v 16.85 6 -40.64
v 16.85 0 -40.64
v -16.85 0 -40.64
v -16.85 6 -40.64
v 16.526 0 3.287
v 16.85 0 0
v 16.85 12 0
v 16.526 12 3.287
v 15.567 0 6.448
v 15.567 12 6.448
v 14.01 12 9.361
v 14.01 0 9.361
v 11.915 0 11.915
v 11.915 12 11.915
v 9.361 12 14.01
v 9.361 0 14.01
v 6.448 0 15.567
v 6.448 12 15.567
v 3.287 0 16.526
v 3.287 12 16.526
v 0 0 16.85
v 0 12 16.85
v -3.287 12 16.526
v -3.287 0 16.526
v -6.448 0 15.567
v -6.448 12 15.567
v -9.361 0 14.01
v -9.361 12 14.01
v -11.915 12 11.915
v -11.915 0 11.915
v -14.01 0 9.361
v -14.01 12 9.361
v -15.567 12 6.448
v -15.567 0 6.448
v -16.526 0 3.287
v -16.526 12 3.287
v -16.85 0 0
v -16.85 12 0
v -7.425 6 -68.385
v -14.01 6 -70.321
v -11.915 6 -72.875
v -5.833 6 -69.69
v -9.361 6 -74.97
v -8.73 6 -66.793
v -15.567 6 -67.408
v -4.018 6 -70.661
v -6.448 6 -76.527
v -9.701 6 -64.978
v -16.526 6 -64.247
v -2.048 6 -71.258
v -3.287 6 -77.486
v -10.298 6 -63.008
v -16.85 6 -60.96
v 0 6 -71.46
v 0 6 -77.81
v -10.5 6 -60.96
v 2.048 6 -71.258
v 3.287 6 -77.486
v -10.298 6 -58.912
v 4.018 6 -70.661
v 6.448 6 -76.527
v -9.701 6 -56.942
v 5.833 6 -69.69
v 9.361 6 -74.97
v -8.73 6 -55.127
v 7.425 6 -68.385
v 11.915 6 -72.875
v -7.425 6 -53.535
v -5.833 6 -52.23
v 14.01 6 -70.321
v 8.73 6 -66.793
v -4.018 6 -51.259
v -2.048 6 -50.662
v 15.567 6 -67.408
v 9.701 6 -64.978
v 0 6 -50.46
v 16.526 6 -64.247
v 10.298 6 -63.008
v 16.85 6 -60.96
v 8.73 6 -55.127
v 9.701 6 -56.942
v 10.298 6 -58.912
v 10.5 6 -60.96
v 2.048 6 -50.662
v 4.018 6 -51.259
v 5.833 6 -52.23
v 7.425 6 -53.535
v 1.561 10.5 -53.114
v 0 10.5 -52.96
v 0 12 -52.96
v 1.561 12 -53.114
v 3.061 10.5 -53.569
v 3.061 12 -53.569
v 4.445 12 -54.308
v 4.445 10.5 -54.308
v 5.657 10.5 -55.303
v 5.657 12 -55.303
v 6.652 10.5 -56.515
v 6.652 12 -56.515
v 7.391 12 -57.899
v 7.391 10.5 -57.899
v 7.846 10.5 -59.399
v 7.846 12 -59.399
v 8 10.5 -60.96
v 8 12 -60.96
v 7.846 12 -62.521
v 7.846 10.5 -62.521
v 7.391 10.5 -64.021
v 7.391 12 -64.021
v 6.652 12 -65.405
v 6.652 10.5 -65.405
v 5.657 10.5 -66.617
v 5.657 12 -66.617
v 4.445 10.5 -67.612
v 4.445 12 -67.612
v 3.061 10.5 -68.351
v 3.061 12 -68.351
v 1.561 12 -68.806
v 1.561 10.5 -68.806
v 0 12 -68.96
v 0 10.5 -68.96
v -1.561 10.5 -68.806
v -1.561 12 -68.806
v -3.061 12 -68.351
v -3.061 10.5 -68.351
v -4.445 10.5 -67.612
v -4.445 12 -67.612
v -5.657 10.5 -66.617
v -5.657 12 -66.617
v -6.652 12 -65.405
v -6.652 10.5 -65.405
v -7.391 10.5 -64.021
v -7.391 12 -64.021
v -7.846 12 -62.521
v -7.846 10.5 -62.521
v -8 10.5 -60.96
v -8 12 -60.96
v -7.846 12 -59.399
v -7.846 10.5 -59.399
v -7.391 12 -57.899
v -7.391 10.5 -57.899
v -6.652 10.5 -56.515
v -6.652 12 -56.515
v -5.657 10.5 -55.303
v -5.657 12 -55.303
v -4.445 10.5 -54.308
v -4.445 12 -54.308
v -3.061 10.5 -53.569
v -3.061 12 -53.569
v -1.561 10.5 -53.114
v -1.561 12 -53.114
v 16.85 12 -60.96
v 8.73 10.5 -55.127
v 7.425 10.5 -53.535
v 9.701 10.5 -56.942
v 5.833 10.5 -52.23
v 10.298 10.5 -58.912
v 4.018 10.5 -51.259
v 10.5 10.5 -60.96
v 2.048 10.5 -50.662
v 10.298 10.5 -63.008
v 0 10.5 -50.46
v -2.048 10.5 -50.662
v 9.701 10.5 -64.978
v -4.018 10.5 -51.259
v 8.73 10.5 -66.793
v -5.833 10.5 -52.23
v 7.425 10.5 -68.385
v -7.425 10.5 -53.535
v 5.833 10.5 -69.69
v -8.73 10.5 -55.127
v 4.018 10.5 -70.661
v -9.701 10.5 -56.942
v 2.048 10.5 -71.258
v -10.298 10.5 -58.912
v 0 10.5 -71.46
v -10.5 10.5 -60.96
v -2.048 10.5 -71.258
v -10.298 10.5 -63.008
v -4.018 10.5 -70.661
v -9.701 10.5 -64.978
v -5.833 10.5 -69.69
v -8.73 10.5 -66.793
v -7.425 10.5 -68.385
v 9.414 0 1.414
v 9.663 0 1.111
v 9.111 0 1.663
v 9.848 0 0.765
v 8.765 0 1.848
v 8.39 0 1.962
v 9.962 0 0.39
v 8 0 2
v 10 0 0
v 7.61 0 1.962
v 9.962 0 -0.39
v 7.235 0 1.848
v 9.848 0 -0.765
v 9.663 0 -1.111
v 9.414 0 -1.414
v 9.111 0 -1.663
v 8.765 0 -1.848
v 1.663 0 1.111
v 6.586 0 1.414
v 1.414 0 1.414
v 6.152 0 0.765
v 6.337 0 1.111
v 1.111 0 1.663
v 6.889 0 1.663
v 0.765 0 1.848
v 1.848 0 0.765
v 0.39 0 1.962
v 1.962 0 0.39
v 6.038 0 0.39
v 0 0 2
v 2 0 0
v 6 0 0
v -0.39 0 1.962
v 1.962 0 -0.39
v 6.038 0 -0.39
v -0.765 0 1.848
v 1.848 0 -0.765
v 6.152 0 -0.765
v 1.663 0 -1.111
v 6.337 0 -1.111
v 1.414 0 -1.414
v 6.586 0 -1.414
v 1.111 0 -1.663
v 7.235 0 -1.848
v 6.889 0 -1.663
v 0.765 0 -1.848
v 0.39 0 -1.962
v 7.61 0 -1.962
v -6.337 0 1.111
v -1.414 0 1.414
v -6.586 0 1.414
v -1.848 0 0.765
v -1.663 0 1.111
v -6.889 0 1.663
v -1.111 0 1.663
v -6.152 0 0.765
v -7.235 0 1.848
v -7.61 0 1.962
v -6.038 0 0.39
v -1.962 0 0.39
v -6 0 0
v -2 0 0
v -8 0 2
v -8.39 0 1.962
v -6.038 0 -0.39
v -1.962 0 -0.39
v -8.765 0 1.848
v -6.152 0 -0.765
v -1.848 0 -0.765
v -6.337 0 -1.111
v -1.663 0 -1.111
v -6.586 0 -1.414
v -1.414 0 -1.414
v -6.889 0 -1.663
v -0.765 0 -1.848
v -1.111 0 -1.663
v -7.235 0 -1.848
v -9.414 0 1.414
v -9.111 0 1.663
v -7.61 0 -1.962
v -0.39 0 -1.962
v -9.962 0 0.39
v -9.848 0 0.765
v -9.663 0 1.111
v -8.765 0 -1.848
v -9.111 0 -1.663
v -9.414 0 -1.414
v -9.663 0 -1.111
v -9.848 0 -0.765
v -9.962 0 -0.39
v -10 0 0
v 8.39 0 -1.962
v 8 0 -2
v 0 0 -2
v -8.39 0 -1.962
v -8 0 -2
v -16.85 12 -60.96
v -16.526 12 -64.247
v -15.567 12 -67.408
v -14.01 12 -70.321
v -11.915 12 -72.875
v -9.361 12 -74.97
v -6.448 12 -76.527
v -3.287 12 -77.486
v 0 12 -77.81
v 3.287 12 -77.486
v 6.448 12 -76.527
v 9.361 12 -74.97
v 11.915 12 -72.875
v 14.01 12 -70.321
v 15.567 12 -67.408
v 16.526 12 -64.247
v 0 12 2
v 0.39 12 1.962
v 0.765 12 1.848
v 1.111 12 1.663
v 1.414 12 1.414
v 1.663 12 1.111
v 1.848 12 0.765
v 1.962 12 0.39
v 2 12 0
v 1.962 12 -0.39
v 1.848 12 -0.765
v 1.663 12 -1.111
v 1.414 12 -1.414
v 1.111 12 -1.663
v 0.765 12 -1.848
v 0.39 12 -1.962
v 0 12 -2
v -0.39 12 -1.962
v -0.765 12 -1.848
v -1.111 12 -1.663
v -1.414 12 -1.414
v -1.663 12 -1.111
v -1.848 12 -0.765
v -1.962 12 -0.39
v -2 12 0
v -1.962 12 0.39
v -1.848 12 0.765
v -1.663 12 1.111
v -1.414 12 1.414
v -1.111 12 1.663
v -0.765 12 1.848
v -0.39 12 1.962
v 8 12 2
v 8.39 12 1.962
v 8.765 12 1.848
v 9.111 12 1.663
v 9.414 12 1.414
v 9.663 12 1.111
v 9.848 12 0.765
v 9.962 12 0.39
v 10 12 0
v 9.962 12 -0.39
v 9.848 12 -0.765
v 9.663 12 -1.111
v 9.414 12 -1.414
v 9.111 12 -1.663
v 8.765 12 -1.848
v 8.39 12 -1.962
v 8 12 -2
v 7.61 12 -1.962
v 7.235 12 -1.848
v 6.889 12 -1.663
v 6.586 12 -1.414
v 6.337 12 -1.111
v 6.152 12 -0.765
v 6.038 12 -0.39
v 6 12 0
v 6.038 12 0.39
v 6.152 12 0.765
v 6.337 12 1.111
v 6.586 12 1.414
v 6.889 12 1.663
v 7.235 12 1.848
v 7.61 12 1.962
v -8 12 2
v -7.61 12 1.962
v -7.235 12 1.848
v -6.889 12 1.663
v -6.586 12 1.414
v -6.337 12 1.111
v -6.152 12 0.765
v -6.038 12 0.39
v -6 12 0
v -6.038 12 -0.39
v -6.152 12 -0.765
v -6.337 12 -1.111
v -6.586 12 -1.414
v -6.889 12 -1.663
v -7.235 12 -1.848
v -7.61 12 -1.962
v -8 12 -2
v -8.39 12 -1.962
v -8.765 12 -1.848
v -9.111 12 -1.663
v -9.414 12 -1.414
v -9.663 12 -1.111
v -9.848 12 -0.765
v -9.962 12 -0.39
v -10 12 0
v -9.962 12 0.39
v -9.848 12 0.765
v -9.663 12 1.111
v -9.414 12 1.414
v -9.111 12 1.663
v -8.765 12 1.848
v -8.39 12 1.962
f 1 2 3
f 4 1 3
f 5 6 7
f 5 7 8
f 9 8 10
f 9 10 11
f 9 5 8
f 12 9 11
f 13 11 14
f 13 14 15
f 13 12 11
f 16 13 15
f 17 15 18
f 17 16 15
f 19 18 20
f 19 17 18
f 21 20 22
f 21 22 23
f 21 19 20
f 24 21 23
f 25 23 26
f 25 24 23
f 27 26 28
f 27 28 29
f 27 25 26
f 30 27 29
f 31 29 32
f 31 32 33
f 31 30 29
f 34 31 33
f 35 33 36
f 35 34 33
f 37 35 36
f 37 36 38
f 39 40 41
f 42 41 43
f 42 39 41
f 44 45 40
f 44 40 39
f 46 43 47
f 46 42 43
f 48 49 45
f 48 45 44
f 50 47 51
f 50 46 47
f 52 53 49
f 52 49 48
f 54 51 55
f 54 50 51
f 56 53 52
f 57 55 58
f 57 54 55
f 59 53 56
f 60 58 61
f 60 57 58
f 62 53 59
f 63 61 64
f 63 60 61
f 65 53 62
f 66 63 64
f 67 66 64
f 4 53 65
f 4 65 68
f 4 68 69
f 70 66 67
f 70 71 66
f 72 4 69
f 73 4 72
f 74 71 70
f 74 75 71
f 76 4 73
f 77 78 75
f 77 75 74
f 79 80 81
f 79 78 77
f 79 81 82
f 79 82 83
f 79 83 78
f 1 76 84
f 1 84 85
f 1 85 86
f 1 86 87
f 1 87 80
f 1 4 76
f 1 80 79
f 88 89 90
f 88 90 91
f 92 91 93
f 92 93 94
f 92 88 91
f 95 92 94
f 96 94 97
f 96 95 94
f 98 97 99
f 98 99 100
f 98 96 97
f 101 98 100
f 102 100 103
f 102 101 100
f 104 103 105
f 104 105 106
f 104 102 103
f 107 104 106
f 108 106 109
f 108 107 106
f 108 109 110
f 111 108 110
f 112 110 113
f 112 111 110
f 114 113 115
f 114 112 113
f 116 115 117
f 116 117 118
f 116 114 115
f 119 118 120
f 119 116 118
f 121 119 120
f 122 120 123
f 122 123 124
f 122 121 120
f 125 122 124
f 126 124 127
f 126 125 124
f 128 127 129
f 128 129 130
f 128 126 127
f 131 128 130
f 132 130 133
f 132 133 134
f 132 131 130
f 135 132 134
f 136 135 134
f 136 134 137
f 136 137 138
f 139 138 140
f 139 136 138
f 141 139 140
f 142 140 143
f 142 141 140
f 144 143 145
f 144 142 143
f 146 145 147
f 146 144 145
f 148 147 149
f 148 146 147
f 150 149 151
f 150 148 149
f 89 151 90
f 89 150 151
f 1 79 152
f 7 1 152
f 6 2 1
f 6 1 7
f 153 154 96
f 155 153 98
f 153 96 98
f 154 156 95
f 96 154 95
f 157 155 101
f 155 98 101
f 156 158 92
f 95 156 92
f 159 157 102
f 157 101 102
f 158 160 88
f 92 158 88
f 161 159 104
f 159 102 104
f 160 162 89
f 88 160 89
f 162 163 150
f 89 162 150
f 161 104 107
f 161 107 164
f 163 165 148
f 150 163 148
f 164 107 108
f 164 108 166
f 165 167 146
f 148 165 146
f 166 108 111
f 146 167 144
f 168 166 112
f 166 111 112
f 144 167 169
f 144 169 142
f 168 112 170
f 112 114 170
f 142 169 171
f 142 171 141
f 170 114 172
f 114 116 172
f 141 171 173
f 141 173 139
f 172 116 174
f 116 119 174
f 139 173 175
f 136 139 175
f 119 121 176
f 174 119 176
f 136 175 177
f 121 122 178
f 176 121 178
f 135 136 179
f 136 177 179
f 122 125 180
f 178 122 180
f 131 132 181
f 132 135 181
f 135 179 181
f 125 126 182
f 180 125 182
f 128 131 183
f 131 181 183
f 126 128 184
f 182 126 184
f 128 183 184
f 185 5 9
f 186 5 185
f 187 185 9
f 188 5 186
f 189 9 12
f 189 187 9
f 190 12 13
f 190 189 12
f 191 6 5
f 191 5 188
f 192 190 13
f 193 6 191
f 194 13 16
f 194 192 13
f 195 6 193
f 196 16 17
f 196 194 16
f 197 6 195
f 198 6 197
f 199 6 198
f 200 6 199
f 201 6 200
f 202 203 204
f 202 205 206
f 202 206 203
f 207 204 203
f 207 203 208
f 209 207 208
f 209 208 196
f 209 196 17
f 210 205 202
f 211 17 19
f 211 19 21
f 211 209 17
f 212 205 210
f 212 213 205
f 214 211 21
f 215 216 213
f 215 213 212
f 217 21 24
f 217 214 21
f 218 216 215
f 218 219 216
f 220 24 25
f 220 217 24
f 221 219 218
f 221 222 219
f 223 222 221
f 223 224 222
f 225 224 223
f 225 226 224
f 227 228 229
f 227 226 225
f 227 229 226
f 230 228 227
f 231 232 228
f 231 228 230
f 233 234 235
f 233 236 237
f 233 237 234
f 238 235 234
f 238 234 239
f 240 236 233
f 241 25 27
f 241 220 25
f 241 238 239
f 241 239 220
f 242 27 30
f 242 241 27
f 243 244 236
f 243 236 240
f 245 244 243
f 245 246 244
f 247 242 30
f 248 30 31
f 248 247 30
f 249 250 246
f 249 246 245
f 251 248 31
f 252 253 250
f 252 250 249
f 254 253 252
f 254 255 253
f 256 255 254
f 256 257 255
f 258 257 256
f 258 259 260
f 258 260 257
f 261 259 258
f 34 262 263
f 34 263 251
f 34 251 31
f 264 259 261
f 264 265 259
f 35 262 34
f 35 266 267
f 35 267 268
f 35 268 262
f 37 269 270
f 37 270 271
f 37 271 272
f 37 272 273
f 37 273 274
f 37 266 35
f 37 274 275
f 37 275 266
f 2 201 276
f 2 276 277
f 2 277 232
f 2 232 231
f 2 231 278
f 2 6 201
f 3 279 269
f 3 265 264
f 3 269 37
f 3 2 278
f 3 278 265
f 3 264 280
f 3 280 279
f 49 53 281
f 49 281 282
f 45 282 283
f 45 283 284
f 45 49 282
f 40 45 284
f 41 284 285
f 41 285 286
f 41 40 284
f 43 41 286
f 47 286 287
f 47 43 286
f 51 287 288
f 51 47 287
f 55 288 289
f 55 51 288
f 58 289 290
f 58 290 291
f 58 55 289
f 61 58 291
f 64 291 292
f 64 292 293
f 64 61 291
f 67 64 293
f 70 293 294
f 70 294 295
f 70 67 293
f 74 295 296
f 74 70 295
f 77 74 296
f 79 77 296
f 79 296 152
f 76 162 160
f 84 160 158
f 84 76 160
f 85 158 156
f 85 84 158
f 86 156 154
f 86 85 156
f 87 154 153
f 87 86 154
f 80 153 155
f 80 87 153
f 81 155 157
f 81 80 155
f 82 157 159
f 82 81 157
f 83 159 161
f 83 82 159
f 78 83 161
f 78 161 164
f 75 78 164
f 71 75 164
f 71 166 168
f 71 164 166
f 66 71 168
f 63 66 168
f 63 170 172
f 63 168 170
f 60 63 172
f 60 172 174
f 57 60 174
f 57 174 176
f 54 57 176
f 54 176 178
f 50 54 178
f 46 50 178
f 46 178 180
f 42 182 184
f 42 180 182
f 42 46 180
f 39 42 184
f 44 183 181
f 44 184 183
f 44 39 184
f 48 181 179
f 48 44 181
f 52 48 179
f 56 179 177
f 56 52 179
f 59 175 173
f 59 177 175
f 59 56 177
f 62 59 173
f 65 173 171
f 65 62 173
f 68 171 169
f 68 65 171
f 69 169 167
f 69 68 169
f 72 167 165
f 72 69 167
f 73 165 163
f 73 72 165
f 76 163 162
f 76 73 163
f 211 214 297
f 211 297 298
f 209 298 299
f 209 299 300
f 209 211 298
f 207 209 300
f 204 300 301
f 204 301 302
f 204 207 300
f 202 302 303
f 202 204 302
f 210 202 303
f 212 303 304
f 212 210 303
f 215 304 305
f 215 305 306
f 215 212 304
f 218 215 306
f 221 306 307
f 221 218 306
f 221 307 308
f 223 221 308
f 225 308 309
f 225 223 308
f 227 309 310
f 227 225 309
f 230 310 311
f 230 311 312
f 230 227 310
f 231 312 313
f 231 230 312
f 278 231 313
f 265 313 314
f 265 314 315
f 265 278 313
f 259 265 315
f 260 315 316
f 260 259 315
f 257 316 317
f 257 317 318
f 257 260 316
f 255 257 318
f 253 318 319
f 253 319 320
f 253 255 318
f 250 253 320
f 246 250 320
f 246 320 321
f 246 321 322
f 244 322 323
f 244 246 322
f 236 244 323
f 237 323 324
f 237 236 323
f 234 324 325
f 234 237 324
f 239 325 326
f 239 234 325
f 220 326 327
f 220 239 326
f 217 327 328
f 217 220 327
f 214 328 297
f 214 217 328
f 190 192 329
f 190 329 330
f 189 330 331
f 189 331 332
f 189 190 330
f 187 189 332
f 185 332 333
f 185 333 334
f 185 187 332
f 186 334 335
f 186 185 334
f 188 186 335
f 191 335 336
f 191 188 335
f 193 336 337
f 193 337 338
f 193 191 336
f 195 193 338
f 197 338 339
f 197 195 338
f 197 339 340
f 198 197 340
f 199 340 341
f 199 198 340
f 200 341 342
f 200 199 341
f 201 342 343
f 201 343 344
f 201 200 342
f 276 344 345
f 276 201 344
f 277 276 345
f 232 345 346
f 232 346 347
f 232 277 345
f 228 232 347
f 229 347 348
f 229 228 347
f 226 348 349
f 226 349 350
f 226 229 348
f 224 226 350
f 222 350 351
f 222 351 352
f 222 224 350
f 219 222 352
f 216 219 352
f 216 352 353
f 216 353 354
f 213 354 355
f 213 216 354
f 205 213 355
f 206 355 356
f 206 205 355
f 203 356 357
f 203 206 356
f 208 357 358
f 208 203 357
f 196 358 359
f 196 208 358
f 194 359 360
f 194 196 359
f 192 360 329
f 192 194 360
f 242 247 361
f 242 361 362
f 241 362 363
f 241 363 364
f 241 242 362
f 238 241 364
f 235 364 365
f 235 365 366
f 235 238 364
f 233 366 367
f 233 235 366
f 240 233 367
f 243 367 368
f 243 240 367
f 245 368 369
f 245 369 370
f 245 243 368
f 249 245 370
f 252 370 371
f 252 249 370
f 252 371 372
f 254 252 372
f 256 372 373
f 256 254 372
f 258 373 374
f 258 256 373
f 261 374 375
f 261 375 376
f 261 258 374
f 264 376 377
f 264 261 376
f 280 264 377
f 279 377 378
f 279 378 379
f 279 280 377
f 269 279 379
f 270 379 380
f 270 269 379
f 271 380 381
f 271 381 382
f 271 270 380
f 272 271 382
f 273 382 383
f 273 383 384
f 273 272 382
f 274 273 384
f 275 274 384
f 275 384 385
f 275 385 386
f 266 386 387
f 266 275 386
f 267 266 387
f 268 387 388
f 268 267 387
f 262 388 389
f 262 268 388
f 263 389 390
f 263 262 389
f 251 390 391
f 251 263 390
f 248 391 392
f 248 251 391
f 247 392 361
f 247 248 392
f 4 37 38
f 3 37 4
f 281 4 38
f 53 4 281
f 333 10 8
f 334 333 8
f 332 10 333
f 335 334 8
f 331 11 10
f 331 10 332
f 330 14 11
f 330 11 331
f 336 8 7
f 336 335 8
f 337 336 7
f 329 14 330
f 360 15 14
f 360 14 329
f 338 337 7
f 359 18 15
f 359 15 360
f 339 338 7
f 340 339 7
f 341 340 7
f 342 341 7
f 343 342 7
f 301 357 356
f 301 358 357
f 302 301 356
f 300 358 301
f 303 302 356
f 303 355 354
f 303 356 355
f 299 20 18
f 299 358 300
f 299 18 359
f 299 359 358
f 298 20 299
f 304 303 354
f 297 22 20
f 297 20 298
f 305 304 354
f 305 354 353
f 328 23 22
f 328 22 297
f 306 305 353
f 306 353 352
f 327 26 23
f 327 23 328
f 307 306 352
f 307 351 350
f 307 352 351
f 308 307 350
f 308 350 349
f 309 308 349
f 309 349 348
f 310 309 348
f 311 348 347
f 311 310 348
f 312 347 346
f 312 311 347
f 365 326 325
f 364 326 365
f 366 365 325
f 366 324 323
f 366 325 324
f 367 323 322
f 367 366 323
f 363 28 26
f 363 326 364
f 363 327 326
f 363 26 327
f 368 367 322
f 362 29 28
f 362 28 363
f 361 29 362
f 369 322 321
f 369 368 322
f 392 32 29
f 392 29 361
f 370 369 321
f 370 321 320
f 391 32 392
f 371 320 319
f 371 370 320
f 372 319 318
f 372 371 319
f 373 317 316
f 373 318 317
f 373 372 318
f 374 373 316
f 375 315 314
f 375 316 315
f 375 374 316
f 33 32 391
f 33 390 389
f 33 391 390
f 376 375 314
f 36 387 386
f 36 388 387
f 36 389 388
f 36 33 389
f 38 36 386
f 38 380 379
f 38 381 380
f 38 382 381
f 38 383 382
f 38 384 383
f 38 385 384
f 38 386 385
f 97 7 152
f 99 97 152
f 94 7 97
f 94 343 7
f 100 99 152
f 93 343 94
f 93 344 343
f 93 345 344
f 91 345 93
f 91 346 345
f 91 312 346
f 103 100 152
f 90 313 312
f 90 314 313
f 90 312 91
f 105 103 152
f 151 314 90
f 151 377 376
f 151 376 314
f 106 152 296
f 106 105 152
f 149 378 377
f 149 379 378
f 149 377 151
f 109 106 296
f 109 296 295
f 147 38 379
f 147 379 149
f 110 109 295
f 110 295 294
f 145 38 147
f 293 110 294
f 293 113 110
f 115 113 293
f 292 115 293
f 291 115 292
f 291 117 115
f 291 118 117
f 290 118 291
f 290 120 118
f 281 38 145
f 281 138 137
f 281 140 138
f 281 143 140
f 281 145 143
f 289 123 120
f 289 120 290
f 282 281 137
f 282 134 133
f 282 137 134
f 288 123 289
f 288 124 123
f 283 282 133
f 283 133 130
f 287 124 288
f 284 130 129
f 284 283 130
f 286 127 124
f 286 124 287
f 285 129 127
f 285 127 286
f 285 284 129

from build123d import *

# Parameters (mm, degrees)
SKETCH1_R           = 10.499999955
SKETCH1_R_2         = 2
BOSS_EXTRUDE1_DEPTH = 12
SKETCH2_R           = 10.499999955
CUT_EXTRUDE1_DEPTH  = 6
BOSS_EXTRUDE2_START = -1.5
SKETCH3_R           = 10.499999955
SKETCH3_R_2         = 8
BOSS_EXTRUDE2_DEPTH = 1.5


with BuildPart() as part:
    # Sketch1 → Boss-Extrude1 (new body)
    with BuildSketch(Plane(origin=(0, 0, 0), x_dir=(1, 0, 0), z_dir=(0, 1, 0))):
        with BuildLine():
            Line((-16.85, 0), (-16.85, 60.96))
            ThreePointArc((-16.85, 60.96), (0, 77.81), (16.85, 60.96))
            Line((16.85, 60.96), (16.85, 0))
            ThreePointArc((16.85, 0), (0, -16.85), (-16.85, 0))
        make_face()
        with Locations(Location((0, 60.96, 0), (0, 0, 270))):
            Circle(SKETCH1_R, mode=Mode.SUBTRACT)
        with Locations(Location((-8, 0, 0), (0, 0, 270))):
            Circle(SKETCH1_R_2, mode=Mode.SUBTRACT)
        with Locations(Location((8, 0, 0), (0, 0, 270))):
            Circle(SKETCH1_R_2, mode=Mode.SUBTRACT)
        with Locations(Location((0, 0, 0), (0, 0, 270))):
            Circle(SKETCH1_R_2, mode=Mode.SUBTRACT)
    extrude(amount=BOSS_EXTRUDE1_DEPTH)

    # Sketch2 → Cut-Extrude1 (cut)
    with BuildSketch(Plane.XZ):
        with BuildLine():
            Line((-16.85, -40.64), (-16.85, -60.96))
            ThreePointArc((-16.85, -60.96), (0, -77.81), (16.85, -60.96))
            Line((16.85, -60.96), (16.85, -40.64))
            Line((16.85, -40.64), (-16.85, -40.64))
        make_face()
        with Locations(Location((0, -60.96, 0), (0, 0, 270))):
            Circle(SKETCH2_R, mode=Mode.SUBTRACT)
    extrude(amount=-CUT_EXTRUDE1_DEPTH, mode=Mode.SUBTRACT)

    # Sketch3 → Boss-Extrude2 (add)
    with BuildSketch(Plane(origin=(0, 12, 0), x_dir=(1, 0, 0), z_dir=(0, 1, 0)).offset(BOSS_EXTRUDE2_START)):
        with Locations(Location((0, 60.96, 0), (0, 0, 90))):
            Circle(SKETCH3_R)
        with Locations(Location((0, 60.96, 0), (0, 0, 270))):
            Circle(SKETCH3_R_2, mode=Mode.SUBTRACT)
    extrude(amount=BOSS_EXTRUDE2_DEPTH)


solid = part.part
